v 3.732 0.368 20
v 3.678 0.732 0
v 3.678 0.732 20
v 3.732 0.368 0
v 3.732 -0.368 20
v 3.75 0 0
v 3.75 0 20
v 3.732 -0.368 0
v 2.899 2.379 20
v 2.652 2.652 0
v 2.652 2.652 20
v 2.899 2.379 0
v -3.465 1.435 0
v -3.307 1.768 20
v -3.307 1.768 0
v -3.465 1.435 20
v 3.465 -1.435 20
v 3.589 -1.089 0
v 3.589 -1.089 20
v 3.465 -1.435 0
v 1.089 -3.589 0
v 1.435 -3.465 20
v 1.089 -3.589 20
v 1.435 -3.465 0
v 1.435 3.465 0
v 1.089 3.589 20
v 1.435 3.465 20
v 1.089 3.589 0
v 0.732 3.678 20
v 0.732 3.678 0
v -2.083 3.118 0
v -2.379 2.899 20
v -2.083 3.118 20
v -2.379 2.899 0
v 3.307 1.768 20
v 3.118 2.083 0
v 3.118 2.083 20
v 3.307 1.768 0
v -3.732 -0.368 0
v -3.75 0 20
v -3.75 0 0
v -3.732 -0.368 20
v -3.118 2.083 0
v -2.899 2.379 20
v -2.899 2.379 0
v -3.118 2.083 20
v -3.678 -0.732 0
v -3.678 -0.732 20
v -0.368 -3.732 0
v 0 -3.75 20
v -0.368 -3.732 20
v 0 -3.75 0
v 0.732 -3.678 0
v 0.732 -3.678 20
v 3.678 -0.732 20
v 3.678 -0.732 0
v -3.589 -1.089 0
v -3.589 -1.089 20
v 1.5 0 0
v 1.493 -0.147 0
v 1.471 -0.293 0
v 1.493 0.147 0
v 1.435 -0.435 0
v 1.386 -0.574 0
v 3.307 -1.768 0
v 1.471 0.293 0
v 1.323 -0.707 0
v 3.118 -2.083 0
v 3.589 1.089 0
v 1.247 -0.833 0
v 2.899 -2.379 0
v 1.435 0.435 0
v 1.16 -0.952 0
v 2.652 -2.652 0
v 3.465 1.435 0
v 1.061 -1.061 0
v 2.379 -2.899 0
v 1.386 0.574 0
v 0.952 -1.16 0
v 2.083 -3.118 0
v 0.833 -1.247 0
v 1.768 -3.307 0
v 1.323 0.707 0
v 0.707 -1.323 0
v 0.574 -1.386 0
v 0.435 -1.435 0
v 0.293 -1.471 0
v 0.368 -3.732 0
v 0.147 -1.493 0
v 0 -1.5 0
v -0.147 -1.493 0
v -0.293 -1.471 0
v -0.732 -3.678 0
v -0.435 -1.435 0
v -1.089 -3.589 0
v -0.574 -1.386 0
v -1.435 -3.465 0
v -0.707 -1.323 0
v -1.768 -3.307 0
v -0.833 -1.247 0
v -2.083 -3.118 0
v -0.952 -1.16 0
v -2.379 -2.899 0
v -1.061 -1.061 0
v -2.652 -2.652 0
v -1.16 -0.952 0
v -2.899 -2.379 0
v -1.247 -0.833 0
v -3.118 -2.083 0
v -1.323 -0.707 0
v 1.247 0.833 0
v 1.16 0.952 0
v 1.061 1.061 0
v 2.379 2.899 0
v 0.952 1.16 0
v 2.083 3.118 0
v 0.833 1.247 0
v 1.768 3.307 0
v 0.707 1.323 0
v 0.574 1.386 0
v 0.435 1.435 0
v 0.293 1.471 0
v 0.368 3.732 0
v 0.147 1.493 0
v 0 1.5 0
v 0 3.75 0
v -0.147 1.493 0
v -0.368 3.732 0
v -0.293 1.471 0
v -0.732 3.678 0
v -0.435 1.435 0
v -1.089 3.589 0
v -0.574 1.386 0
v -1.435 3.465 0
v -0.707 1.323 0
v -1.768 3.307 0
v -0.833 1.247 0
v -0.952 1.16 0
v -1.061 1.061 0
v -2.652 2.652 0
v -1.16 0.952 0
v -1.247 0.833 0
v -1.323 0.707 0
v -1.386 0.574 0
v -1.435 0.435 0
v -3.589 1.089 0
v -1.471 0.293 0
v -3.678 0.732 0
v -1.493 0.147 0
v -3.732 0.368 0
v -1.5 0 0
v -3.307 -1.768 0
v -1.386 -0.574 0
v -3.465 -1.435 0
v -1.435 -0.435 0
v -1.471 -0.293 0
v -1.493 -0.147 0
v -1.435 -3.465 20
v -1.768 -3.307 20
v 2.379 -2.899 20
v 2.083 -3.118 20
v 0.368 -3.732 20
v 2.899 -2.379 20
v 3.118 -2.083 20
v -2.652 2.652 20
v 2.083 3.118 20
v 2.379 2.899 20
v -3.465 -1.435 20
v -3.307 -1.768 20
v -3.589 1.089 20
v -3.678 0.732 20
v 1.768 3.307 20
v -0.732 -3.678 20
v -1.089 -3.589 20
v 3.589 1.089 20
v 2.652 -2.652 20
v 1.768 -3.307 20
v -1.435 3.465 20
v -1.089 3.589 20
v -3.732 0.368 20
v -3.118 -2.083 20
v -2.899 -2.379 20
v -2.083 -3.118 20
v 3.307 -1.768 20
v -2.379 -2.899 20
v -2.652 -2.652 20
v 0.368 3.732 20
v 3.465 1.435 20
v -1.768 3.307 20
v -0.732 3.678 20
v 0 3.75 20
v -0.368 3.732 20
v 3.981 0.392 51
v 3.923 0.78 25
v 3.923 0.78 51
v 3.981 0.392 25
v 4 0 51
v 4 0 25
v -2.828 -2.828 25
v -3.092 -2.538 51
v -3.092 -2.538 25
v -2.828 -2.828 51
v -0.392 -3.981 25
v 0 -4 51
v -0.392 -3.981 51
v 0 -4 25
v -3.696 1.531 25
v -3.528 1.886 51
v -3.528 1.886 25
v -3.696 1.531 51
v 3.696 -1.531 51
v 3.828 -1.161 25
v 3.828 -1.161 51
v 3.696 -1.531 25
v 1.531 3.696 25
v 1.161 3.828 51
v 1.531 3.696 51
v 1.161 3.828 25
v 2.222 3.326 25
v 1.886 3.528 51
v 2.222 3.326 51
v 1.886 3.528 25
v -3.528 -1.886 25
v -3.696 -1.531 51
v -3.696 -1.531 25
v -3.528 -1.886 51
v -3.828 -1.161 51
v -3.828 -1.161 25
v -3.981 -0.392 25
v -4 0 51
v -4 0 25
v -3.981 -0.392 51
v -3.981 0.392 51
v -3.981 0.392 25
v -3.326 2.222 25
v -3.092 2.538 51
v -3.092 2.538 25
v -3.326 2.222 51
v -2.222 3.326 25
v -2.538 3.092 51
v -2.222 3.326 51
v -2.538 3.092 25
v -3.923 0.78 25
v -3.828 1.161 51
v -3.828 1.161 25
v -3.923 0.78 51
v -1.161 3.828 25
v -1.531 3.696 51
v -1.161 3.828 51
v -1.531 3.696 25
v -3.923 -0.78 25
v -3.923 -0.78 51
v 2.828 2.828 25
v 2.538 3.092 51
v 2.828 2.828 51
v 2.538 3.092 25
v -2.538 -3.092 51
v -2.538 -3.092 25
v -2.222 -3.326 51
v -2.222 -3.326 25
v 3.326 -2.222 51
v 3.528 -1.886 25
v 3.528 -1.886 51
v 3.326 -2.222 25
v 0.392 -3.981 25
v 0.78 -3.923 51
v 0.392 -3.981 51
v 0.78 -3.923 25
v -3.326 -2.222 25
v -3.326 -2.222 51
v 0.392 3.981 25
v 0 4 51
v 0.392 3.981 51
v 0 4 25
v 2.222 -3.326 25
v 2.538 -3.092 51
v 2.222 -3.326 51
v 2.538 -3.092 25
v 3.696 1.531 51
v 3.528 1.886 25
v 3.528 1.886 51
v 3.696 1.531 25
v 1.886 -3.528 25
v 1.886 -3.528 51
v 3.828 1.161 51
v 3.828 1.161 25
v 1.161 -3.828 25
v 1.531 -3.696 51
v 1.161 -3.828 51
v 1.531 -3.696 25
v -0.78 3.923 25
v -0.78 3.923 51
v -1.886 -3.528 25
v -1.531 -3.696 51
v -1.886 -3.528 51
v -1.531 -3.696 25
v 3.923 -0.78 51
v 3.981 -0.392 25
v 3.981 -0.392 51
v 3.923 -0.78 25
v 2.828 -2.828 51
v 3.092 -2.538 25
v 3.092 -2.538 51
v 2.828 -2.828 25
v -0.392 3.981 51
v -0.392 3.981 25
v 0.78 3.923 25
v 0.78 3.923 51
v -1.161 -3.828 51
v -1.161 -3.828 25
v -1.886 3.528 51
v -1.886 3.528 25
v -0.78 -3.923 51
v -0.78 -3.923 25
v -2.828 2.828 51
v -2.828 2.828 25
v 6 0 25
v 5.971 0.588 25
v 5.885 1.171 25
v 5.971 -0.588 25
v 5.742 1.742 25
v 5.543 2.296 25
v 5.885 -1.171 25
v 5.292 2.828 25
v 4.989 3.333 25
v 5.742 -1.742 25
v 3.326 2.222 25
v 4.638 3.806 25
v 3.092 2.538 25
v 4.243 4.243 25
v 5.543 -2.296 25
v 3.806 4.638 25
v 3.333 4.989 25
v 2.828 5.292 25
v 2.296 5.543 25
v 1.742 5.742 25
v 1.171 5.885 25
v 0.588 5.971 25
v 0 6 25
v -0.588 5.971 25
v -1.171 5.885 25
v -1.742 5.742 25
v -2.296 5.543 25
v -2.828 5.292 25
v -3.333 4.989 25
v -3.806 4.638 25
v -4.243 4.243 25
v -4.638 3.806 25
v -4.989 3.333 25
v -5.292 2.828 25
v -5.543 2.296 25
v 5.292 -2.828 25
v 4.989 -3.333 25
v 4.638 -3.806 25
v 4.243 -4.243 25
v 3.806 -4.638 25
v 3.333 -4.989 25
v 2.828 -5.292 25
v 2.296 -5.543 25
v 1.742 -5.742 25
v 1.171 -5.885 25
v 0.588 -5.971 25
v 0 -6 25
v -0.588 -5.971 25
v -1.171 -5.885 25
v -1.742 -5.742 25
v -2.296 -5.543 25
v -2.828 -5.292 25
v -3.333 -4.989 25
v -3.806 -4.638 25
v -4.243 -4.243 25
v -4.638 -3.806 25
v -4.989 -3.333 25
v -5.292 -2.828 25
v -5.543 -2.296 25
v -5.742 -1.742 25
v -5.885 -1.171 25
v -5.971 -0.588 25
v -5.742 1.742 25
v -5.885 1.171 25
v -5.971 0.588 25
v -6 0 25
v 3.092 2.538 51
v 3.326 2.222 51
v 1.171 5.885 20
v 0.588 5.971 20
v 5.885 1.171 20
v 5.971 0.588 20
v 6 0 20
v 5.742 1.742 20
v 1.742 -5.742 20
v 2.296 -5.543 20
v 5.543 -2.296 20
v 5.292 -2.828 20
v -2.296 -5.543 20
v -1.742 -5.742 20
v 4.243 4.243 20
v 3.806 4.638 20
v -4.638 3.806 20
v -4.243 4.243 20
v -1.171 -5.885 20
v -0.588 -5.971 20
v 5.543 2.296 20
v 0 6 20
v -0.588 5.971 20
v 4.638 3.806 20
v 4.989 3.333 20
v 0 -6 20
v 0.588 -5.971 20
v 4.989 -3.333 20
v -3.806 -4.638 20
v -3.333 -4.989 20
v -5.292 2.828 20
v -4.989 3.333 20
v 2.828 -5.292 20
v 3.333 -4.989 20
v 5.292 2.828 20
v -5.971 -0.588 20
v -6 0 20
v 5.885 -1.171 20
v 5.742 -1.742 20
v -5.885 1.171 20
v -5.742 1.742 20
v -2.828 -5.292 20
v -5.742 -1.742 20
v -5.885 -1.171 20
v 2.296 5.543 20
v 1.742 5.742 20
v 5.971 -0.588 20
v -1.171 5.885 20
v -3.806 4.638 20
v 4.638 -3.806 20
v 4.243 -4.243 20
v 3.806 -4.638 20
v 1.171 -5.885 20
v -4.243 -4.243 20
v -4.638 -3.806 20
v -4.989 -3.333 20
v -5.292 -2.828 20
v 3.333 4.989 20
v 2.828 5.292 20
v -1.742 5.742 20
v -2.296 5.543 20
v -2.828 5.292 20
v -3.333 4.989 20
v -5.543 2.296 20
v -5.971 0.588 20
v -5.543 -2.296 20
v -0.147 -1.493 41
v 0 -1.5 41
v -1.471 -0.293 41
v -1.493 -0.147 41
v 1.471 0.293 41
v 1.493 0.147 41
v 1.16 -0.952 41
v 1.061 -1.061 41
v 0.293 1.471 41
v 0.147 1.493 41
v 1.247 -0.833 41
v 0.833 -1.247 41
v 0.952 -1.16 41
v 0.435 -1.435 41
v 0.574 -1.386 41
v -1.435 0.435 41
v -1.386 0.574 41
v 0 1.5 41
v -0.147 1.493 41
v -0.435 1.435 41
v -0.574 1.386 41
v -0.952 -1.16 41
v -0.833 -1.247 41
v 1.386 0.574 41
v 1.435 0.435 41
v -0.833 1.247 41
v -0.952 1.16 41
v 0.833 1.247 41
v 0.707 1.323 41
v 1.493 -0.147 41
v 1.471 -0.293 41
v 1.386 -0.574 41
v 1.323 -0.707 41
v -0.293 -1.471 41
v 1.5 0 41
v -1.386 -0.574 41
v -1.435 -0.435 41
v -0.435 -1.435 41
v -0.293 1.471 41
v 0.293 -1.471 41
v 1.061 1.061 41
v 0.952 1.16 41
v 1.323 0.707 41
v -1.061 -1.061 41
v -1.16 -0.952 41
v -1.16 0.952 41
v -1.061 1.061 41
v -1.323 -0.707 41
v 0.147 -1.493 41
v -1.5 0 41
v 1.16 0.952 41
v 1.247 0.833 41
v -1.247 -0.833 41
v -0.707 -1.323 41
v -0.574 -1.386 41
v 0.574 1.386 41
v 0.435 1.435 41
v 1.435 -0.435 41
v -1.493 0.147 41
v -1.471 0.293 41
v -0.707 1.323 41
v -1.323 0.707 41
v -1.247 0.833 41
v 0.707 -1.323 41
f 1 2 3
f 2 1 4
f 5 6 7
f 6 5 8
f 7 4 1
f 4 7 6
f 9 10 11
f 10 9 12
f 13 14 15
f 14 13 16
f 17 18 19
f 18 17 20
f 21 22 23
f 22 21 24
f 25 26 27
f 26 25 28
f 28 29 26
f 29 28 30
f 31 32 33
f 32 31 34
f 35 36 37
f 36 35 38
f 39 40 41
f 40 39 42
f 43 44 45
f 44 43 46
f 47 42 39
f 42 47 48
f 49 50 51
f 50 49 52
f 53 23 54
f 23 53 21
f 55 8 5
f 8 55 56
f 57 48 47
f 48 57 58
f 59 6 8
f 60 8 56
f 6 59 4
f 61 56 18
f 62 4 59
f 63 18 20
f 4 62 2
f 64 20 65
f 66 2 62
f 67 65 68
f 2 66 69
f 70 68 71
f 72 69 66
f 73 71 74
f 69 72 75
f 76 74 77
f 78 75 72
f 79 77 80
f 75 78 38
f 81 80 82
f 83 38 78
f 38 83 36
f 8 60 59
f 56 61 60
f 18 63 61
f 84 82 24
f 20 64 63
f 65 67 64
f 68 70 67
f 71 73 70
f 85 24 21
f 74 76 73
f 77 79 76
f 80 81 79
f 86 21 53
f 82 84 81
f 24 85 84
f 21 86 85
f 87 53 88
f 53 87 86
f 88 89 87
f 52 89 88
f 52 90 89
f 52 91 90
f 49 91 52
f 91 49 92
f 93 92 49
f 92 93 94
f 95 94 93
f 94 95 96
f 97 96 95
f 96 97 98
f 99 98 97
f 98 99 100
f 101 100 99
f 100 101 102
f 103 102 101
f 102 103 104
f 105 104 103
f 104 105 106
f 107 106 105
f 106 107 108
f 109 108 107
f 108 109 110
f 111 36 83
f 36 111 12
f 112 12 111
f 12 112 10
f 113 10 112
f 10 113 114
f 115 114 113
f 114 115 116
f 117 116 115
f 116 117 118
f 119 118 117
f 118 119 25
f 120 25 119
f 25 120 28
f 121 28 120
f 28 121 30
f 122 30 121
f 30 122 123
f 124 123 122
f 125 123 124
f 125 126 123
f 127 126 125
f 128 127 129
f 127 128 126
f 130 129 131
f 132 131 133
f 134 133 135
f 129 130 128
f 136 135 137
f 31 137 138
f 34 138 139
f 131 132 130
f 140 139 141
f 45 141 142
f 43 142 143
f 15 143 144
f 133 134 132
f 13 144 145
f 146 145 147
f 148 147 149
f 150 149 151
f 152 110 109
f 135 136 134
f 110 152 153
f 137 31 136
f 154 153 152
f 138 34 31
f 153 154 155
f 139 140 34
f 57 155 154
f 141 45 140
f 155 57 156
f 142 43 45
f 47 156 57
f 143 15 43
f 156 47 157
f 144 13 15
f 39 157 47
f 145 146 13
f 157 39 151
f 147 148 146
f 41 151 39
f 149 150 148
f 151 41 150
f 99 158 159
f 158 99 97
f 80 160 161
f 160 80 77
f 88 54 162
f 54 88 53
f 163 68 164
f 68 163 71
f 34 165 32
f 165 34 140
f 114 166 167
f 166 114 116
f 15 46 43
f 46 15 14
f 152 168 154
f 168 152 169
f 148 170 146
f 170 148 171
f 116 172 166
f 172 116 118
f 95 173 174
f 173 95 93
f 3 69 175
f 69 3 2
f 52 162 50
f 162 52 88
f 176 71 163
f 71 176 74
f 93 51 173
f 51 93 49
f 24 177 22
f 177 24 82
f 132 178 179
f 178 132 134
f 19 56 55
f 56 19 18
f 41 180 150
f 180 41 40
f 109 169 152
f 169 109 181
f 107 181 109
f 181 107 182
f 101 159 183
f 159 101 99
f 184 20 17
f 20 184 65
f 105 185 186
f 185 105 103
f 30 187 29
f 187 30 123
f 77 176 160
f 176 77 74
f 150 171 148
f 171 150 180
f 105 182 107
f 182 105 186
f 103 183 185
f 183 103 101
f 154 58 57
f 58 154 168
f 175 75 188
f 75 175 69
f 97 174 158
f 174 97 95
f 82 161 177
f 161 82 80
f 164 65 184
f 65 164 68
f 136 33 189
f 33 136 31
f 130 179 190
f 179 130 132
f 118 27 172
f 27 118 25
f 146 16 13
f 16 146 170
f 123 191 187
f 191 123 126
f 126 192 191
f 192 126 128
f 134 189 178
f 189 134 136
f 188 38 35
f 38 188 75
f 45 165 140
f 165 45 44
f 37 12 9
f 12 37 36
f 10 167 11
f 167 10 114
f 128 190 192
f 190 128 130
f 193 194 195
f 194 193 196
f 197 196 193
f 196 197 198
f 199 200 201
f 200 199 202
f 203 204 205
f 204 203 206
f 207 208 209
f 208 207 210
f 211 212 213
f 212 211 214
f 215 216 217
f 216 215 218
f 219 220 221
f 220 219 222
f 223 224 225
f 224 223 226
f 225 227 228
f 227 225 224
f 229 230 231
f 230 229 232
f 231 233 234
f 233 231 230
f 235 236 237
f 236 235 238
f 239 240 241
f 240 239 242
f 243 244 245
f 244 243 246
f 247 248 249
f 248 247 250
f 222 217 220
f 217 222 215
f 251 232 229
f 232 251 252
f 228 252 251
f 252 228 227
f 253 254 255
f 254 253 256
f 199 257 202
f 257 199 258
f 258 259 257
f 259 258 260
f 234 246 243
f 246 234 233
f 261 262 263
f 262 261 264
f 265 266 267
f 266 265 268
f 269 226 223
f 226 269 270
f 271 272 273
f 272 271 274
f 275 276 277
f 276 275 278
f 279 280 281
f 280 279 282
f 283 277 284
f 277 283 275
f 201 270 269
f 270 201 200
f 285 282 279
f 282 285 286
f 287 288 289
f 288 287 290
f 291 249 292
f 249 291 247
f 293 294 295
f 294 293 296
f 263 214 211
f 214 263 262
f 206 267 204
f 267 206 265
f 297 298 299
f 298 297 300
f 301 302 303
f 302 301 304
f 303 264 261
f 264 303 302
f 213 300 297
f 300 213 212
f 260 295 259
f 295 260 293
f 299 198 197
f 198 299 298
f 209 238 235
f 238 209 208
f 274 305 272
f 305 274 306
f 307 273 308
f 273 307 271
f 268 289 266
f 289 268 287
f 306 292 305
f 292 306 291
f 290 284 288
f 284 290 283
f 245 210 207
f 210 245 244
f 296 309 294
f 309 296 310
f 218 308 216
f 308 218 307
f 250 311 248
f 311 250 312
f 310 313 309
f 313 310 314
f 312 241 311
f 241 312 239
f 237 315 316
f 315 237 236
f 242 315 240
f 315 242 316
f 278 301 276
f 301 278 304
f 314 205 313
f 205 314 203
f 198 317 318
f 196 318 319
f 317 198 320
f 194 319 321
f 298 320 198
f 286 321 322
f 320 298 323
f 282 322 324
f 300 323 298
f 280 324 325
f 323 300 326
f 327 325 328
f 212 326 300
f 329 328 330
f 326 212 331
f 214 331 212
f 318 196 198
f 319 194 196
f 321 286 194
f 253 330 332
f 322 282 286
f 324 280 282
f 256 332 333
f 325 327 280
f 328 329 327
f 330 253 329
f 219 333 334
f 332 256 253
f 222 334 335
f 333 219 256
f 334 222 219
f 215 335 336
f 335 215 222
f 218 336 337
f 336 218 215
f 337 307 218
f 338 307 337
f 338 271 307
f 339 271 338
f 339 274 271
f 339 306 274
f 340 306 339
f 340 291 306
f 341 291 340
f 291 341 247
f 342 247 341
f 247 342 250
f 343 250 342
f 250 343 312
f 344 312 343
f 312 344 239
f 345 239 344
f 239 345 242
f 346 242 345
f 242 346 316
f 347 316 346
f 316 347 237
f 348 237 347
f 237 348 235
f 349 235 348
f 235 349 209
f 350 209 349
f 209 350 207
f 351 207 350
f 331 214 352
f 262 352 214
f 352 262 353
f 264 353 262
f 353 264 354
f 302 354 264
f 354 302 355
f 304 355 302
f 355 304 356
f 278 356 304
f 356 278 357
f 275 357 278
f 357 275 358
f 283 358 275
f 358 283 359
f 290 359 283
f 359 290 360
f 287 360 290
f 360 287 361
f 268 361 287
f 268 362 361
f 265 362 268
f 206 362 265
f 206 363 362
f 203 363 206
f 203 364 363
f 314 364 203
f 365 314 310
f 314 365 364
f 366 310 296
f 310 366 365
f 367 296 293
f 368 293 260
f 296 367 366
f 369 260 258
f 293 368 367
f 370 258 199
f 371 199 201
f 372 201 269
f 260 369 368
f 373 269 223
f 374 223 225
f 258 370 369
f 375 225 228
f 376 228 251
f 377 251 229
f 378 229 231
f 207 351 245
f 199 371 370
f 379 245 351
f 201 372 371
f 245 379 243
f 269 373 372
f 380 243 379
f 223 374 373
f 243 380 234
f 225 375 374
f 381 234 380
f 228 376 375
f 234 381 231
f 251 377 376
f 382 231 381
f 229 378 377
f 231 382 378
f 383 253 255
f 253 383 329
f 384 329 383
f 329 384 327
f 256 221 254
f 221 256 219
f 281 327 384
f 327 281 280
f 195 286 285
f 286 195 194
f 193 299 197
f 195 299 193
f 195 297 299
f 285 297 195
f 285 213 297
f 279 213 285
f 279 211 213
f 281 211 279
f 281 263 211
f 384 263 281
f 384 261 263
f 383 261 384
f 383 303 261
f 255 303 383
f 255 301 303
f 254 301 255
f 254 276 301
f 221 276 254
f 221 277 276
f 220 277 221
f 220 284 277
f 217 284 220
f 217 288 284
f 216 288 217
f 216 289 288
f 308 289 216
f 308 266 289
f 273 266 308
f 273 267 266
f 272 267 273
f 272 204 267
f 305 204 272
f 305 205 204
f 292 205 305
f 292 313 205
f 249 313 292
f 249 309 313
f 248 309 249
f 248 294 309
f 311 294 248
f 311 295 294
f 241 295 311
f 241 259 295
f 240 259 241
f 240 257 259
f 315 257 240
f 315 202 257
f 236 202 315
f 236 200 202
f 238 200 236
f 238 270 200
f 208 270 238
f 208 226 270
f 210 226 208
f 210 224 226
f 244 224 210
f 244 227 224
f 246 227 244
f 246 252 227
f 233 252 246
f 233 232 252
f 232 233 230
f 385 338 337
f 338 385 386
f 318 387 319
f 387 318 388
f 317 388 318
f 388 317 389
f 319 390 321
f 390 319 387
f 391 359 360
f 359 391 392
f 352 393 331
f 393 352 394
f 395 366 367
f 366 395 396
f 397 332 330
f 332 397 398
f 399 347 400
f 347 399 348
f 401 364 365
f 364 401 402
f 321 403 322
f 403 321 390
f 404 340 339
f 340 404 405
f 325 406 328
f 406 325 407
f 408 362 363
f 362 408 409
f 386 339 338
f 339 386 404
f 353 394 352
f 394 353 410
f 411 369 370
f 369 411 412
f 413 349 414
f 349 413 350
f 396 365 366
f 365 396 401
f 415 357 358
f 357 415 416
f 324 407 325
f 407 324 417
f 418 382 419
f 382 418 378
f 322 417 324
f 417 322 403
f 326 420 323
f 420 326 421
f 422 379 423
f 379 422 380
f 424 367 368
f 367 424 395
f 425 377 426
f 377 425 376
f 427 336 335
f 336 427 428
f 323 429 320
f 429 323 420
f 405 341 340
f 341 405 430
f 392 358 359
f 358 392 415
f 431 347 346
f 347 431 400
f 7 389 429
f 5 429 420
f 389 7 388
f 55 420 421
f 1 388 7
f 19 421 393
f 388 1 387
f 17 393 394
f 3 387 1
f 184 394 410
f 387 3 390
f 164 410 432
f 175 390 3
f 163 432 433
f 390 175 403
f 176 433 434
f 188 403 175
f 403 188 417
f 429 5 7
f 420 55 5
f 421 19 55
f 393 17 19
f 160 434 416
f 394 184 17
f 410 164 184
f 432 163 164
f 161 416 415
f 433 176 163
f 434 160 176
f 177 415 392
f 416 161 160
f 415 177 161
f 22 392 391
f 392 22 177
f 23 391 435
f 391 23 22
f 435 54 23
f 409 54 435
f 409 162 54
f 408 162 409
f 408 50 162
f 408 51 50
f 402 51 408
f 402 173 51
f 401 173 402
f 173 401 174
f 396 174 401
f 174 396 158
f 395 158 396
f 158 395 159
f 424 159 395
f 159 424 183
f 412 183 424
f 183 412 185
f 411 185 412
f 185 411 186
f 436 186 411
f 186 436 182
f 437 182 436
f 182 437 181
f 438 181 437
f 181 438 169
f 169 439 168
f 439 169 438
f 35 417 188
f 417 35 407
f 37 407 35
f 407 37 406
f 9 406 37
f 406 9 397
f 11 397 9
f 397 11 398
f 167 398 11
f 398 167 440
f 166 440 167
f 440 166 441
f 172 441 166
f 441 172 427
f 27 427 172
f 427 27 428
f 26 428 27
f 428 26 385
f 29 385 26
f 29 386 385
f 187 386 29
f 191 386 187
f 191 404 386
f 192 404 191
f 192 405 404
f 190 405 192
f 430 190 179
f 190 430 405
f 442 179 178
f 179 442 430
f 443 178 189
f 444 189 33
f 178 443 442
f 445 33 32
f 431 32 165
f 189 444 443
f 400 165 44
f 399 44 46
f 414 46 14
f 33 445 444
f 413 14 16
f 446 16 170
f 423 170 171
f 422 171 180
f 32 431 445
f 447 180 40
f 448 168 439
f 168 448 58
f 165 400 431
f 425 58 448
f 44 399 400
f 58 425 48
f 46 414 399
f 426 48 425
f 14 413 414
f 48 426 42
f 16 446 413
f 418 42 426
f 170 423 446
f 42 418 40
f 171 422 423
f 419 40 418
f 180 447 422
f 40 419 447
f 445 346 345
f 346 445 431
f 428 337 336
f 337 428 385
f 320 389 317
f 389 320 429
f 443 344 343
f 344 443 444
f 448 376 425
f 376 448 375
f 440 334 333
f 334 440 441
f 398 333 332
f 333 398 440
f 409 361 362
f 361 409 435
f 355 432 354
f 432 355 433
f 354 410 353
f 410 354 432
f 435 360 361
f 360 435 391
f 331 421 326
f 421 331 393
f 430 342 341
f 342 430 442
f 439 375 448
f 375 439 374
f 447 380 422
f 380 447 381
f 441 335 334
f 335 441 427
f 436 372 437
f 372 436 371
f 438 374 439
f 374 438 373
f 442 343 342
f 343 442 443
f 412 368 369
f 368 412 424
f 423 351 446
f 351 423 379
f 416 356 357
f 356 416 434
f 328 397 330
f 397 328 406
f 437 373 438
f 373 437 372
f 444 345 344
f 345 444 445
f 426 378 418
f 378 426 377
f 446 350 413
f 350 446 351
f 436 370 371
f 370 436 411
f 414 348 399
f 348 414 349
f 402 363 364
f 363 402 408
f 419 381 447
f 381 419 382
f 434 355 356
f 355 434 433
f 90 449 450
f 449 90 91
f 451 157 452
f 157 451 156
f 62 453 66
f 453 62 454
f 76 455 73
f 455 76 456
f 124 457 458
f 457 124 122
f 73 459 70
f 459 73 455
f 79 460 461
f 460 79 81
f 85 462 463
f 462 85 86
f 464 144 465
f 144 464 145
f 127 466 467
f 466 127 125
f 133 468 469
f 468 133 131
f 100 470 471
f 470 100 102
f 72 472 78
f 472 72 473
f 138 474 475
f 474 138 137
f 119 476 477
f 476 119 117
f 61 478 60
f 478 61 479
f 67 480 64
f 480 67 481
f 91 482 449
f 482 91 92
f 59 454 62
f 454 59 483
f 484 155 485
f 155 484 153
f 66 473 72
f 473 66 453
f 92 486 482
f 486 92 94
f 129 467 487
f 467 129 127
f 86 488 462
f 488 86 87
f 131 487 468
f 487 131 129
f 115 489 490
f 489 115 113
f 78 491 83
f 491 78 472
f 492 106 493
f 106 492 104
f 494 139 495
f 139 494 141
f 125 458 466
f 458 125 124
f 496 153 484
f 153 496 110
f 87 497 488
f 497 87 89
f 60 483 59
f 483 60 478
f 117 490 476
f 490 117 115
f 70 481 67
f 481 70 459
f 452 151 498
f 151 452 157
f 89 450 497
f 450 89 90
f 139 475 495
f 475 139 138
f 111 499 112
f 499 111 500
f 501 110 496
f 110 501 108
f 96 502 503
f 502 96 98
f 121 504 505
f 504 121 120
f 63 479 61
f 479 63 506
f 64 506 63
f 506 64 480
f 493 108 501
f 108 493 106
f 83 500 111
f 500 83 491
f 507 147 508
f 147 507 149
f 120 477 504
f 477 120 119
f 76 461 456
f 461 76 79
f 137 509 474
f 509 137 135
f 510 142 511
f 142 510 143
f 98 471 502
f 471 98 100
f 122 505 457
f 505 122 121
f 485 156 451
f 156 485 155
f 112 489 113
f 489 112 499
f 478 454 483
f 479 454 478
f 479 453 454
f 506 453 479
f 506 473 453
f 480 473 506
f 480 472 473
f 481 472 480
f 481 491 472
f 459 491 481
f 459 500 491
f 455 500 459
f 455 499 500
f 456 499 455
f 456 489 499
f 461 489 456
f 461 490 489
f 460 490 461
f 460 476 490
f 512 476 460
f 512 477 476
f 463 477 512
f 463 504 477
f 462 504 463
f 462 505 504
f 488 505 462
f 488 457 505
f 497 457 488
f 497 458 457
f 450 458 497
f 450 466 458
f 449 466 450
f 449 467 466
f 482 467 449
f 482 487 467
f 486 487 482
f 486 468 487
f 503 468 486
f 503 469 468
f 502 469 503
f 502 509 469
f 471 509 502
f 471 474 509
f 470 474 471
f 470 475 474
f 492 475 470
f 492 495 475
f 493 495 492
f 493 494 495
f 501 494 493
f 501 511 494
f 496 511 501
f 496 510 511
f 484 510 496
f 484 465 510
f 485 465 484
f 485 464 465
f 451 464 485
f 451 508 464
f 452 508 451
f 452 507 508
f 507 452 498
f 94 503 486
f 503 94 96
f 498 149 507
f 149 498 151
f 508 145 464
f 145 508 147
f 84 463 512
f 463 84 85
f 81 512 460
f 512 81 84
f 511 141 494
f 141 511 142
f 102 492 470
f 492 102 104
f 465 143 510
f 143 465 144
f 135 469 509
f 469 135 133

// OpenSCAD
// Hose-barb reducer: 8 mm tubing -> 5 mm tubing
// Print orientation: standing upright along Z

$fn = 64;

// ---- 8 mm tubing barbs (z = 0 to 20) ----
barb_h_8 = 20;      // total height of stacked barbs
barb_od_bottom_8 = 7.5;  // outer diameter at bottom of barbs
barb_od_top_8 = 9.5;   // outer diameter at top of barbs
barb_count_8 = 2;     // two identical barbs, stacked

// ---- 5 mm tubing barbs (z = 25 to 41) ----
barb_h_5 = 16;      // total height of stacked barbs (8 mm each)
barb_od_bottom_5 = 6.5;  // outer diameter at bottom of barbs
barb_od_top_5 = 5.0;   // outer diameter at top of barbs
barb_count_5 = 2;     // two identical barbs, stacked

// ---- Collar (z = 20 to 25) ----
collar_od = 12;     // outer diameter of cylindrical collar
collar_h = 5;       // height of collar

// ---- Through bore ----
bore = 3;           // diameter of bore running full length

// ---- Derived ----
barb_w = 1.5;       // wall thickness (used for step-down / step-up)
step_od_8 = barb_od_bottom_8 - barb_w;   // OD after step down from 8 mm barbs
step_od_5 = barb_od_bottom_5 + barb_w;   // OD after step up to 5 mm barbs

// Offset between stacked barbs of different types
stack_offset = 10;

module hose_barb_reducer() {
    difference() {
        union() {
            // 8 mm tubing barbs
            for (i = [0 : barb_count_8 - 1]) {
                translate([0, 0, i * stack_offset])
                    linear_extrude(height = barb_h_8)
                        circle(d = barb_od_bottom_8);
            }

            // 5 mm tubing barbs
            for (i = [0 : barb_count_5 - 1]) {
                translate([0, 0, 25 + i * stack_offset])
                    linear_extrude(height = barb_h_5)
                        circle(d = step_od_5);
            }

            // Collar
            translate([0, 0, 20])
                cylinder(d = collar_od, h = collar_h);
        }

        // Through bore
        translate([0, 0, -1])
            cylinder(d = bore, h = 42);
    }
}

hose_barb_reducer();
